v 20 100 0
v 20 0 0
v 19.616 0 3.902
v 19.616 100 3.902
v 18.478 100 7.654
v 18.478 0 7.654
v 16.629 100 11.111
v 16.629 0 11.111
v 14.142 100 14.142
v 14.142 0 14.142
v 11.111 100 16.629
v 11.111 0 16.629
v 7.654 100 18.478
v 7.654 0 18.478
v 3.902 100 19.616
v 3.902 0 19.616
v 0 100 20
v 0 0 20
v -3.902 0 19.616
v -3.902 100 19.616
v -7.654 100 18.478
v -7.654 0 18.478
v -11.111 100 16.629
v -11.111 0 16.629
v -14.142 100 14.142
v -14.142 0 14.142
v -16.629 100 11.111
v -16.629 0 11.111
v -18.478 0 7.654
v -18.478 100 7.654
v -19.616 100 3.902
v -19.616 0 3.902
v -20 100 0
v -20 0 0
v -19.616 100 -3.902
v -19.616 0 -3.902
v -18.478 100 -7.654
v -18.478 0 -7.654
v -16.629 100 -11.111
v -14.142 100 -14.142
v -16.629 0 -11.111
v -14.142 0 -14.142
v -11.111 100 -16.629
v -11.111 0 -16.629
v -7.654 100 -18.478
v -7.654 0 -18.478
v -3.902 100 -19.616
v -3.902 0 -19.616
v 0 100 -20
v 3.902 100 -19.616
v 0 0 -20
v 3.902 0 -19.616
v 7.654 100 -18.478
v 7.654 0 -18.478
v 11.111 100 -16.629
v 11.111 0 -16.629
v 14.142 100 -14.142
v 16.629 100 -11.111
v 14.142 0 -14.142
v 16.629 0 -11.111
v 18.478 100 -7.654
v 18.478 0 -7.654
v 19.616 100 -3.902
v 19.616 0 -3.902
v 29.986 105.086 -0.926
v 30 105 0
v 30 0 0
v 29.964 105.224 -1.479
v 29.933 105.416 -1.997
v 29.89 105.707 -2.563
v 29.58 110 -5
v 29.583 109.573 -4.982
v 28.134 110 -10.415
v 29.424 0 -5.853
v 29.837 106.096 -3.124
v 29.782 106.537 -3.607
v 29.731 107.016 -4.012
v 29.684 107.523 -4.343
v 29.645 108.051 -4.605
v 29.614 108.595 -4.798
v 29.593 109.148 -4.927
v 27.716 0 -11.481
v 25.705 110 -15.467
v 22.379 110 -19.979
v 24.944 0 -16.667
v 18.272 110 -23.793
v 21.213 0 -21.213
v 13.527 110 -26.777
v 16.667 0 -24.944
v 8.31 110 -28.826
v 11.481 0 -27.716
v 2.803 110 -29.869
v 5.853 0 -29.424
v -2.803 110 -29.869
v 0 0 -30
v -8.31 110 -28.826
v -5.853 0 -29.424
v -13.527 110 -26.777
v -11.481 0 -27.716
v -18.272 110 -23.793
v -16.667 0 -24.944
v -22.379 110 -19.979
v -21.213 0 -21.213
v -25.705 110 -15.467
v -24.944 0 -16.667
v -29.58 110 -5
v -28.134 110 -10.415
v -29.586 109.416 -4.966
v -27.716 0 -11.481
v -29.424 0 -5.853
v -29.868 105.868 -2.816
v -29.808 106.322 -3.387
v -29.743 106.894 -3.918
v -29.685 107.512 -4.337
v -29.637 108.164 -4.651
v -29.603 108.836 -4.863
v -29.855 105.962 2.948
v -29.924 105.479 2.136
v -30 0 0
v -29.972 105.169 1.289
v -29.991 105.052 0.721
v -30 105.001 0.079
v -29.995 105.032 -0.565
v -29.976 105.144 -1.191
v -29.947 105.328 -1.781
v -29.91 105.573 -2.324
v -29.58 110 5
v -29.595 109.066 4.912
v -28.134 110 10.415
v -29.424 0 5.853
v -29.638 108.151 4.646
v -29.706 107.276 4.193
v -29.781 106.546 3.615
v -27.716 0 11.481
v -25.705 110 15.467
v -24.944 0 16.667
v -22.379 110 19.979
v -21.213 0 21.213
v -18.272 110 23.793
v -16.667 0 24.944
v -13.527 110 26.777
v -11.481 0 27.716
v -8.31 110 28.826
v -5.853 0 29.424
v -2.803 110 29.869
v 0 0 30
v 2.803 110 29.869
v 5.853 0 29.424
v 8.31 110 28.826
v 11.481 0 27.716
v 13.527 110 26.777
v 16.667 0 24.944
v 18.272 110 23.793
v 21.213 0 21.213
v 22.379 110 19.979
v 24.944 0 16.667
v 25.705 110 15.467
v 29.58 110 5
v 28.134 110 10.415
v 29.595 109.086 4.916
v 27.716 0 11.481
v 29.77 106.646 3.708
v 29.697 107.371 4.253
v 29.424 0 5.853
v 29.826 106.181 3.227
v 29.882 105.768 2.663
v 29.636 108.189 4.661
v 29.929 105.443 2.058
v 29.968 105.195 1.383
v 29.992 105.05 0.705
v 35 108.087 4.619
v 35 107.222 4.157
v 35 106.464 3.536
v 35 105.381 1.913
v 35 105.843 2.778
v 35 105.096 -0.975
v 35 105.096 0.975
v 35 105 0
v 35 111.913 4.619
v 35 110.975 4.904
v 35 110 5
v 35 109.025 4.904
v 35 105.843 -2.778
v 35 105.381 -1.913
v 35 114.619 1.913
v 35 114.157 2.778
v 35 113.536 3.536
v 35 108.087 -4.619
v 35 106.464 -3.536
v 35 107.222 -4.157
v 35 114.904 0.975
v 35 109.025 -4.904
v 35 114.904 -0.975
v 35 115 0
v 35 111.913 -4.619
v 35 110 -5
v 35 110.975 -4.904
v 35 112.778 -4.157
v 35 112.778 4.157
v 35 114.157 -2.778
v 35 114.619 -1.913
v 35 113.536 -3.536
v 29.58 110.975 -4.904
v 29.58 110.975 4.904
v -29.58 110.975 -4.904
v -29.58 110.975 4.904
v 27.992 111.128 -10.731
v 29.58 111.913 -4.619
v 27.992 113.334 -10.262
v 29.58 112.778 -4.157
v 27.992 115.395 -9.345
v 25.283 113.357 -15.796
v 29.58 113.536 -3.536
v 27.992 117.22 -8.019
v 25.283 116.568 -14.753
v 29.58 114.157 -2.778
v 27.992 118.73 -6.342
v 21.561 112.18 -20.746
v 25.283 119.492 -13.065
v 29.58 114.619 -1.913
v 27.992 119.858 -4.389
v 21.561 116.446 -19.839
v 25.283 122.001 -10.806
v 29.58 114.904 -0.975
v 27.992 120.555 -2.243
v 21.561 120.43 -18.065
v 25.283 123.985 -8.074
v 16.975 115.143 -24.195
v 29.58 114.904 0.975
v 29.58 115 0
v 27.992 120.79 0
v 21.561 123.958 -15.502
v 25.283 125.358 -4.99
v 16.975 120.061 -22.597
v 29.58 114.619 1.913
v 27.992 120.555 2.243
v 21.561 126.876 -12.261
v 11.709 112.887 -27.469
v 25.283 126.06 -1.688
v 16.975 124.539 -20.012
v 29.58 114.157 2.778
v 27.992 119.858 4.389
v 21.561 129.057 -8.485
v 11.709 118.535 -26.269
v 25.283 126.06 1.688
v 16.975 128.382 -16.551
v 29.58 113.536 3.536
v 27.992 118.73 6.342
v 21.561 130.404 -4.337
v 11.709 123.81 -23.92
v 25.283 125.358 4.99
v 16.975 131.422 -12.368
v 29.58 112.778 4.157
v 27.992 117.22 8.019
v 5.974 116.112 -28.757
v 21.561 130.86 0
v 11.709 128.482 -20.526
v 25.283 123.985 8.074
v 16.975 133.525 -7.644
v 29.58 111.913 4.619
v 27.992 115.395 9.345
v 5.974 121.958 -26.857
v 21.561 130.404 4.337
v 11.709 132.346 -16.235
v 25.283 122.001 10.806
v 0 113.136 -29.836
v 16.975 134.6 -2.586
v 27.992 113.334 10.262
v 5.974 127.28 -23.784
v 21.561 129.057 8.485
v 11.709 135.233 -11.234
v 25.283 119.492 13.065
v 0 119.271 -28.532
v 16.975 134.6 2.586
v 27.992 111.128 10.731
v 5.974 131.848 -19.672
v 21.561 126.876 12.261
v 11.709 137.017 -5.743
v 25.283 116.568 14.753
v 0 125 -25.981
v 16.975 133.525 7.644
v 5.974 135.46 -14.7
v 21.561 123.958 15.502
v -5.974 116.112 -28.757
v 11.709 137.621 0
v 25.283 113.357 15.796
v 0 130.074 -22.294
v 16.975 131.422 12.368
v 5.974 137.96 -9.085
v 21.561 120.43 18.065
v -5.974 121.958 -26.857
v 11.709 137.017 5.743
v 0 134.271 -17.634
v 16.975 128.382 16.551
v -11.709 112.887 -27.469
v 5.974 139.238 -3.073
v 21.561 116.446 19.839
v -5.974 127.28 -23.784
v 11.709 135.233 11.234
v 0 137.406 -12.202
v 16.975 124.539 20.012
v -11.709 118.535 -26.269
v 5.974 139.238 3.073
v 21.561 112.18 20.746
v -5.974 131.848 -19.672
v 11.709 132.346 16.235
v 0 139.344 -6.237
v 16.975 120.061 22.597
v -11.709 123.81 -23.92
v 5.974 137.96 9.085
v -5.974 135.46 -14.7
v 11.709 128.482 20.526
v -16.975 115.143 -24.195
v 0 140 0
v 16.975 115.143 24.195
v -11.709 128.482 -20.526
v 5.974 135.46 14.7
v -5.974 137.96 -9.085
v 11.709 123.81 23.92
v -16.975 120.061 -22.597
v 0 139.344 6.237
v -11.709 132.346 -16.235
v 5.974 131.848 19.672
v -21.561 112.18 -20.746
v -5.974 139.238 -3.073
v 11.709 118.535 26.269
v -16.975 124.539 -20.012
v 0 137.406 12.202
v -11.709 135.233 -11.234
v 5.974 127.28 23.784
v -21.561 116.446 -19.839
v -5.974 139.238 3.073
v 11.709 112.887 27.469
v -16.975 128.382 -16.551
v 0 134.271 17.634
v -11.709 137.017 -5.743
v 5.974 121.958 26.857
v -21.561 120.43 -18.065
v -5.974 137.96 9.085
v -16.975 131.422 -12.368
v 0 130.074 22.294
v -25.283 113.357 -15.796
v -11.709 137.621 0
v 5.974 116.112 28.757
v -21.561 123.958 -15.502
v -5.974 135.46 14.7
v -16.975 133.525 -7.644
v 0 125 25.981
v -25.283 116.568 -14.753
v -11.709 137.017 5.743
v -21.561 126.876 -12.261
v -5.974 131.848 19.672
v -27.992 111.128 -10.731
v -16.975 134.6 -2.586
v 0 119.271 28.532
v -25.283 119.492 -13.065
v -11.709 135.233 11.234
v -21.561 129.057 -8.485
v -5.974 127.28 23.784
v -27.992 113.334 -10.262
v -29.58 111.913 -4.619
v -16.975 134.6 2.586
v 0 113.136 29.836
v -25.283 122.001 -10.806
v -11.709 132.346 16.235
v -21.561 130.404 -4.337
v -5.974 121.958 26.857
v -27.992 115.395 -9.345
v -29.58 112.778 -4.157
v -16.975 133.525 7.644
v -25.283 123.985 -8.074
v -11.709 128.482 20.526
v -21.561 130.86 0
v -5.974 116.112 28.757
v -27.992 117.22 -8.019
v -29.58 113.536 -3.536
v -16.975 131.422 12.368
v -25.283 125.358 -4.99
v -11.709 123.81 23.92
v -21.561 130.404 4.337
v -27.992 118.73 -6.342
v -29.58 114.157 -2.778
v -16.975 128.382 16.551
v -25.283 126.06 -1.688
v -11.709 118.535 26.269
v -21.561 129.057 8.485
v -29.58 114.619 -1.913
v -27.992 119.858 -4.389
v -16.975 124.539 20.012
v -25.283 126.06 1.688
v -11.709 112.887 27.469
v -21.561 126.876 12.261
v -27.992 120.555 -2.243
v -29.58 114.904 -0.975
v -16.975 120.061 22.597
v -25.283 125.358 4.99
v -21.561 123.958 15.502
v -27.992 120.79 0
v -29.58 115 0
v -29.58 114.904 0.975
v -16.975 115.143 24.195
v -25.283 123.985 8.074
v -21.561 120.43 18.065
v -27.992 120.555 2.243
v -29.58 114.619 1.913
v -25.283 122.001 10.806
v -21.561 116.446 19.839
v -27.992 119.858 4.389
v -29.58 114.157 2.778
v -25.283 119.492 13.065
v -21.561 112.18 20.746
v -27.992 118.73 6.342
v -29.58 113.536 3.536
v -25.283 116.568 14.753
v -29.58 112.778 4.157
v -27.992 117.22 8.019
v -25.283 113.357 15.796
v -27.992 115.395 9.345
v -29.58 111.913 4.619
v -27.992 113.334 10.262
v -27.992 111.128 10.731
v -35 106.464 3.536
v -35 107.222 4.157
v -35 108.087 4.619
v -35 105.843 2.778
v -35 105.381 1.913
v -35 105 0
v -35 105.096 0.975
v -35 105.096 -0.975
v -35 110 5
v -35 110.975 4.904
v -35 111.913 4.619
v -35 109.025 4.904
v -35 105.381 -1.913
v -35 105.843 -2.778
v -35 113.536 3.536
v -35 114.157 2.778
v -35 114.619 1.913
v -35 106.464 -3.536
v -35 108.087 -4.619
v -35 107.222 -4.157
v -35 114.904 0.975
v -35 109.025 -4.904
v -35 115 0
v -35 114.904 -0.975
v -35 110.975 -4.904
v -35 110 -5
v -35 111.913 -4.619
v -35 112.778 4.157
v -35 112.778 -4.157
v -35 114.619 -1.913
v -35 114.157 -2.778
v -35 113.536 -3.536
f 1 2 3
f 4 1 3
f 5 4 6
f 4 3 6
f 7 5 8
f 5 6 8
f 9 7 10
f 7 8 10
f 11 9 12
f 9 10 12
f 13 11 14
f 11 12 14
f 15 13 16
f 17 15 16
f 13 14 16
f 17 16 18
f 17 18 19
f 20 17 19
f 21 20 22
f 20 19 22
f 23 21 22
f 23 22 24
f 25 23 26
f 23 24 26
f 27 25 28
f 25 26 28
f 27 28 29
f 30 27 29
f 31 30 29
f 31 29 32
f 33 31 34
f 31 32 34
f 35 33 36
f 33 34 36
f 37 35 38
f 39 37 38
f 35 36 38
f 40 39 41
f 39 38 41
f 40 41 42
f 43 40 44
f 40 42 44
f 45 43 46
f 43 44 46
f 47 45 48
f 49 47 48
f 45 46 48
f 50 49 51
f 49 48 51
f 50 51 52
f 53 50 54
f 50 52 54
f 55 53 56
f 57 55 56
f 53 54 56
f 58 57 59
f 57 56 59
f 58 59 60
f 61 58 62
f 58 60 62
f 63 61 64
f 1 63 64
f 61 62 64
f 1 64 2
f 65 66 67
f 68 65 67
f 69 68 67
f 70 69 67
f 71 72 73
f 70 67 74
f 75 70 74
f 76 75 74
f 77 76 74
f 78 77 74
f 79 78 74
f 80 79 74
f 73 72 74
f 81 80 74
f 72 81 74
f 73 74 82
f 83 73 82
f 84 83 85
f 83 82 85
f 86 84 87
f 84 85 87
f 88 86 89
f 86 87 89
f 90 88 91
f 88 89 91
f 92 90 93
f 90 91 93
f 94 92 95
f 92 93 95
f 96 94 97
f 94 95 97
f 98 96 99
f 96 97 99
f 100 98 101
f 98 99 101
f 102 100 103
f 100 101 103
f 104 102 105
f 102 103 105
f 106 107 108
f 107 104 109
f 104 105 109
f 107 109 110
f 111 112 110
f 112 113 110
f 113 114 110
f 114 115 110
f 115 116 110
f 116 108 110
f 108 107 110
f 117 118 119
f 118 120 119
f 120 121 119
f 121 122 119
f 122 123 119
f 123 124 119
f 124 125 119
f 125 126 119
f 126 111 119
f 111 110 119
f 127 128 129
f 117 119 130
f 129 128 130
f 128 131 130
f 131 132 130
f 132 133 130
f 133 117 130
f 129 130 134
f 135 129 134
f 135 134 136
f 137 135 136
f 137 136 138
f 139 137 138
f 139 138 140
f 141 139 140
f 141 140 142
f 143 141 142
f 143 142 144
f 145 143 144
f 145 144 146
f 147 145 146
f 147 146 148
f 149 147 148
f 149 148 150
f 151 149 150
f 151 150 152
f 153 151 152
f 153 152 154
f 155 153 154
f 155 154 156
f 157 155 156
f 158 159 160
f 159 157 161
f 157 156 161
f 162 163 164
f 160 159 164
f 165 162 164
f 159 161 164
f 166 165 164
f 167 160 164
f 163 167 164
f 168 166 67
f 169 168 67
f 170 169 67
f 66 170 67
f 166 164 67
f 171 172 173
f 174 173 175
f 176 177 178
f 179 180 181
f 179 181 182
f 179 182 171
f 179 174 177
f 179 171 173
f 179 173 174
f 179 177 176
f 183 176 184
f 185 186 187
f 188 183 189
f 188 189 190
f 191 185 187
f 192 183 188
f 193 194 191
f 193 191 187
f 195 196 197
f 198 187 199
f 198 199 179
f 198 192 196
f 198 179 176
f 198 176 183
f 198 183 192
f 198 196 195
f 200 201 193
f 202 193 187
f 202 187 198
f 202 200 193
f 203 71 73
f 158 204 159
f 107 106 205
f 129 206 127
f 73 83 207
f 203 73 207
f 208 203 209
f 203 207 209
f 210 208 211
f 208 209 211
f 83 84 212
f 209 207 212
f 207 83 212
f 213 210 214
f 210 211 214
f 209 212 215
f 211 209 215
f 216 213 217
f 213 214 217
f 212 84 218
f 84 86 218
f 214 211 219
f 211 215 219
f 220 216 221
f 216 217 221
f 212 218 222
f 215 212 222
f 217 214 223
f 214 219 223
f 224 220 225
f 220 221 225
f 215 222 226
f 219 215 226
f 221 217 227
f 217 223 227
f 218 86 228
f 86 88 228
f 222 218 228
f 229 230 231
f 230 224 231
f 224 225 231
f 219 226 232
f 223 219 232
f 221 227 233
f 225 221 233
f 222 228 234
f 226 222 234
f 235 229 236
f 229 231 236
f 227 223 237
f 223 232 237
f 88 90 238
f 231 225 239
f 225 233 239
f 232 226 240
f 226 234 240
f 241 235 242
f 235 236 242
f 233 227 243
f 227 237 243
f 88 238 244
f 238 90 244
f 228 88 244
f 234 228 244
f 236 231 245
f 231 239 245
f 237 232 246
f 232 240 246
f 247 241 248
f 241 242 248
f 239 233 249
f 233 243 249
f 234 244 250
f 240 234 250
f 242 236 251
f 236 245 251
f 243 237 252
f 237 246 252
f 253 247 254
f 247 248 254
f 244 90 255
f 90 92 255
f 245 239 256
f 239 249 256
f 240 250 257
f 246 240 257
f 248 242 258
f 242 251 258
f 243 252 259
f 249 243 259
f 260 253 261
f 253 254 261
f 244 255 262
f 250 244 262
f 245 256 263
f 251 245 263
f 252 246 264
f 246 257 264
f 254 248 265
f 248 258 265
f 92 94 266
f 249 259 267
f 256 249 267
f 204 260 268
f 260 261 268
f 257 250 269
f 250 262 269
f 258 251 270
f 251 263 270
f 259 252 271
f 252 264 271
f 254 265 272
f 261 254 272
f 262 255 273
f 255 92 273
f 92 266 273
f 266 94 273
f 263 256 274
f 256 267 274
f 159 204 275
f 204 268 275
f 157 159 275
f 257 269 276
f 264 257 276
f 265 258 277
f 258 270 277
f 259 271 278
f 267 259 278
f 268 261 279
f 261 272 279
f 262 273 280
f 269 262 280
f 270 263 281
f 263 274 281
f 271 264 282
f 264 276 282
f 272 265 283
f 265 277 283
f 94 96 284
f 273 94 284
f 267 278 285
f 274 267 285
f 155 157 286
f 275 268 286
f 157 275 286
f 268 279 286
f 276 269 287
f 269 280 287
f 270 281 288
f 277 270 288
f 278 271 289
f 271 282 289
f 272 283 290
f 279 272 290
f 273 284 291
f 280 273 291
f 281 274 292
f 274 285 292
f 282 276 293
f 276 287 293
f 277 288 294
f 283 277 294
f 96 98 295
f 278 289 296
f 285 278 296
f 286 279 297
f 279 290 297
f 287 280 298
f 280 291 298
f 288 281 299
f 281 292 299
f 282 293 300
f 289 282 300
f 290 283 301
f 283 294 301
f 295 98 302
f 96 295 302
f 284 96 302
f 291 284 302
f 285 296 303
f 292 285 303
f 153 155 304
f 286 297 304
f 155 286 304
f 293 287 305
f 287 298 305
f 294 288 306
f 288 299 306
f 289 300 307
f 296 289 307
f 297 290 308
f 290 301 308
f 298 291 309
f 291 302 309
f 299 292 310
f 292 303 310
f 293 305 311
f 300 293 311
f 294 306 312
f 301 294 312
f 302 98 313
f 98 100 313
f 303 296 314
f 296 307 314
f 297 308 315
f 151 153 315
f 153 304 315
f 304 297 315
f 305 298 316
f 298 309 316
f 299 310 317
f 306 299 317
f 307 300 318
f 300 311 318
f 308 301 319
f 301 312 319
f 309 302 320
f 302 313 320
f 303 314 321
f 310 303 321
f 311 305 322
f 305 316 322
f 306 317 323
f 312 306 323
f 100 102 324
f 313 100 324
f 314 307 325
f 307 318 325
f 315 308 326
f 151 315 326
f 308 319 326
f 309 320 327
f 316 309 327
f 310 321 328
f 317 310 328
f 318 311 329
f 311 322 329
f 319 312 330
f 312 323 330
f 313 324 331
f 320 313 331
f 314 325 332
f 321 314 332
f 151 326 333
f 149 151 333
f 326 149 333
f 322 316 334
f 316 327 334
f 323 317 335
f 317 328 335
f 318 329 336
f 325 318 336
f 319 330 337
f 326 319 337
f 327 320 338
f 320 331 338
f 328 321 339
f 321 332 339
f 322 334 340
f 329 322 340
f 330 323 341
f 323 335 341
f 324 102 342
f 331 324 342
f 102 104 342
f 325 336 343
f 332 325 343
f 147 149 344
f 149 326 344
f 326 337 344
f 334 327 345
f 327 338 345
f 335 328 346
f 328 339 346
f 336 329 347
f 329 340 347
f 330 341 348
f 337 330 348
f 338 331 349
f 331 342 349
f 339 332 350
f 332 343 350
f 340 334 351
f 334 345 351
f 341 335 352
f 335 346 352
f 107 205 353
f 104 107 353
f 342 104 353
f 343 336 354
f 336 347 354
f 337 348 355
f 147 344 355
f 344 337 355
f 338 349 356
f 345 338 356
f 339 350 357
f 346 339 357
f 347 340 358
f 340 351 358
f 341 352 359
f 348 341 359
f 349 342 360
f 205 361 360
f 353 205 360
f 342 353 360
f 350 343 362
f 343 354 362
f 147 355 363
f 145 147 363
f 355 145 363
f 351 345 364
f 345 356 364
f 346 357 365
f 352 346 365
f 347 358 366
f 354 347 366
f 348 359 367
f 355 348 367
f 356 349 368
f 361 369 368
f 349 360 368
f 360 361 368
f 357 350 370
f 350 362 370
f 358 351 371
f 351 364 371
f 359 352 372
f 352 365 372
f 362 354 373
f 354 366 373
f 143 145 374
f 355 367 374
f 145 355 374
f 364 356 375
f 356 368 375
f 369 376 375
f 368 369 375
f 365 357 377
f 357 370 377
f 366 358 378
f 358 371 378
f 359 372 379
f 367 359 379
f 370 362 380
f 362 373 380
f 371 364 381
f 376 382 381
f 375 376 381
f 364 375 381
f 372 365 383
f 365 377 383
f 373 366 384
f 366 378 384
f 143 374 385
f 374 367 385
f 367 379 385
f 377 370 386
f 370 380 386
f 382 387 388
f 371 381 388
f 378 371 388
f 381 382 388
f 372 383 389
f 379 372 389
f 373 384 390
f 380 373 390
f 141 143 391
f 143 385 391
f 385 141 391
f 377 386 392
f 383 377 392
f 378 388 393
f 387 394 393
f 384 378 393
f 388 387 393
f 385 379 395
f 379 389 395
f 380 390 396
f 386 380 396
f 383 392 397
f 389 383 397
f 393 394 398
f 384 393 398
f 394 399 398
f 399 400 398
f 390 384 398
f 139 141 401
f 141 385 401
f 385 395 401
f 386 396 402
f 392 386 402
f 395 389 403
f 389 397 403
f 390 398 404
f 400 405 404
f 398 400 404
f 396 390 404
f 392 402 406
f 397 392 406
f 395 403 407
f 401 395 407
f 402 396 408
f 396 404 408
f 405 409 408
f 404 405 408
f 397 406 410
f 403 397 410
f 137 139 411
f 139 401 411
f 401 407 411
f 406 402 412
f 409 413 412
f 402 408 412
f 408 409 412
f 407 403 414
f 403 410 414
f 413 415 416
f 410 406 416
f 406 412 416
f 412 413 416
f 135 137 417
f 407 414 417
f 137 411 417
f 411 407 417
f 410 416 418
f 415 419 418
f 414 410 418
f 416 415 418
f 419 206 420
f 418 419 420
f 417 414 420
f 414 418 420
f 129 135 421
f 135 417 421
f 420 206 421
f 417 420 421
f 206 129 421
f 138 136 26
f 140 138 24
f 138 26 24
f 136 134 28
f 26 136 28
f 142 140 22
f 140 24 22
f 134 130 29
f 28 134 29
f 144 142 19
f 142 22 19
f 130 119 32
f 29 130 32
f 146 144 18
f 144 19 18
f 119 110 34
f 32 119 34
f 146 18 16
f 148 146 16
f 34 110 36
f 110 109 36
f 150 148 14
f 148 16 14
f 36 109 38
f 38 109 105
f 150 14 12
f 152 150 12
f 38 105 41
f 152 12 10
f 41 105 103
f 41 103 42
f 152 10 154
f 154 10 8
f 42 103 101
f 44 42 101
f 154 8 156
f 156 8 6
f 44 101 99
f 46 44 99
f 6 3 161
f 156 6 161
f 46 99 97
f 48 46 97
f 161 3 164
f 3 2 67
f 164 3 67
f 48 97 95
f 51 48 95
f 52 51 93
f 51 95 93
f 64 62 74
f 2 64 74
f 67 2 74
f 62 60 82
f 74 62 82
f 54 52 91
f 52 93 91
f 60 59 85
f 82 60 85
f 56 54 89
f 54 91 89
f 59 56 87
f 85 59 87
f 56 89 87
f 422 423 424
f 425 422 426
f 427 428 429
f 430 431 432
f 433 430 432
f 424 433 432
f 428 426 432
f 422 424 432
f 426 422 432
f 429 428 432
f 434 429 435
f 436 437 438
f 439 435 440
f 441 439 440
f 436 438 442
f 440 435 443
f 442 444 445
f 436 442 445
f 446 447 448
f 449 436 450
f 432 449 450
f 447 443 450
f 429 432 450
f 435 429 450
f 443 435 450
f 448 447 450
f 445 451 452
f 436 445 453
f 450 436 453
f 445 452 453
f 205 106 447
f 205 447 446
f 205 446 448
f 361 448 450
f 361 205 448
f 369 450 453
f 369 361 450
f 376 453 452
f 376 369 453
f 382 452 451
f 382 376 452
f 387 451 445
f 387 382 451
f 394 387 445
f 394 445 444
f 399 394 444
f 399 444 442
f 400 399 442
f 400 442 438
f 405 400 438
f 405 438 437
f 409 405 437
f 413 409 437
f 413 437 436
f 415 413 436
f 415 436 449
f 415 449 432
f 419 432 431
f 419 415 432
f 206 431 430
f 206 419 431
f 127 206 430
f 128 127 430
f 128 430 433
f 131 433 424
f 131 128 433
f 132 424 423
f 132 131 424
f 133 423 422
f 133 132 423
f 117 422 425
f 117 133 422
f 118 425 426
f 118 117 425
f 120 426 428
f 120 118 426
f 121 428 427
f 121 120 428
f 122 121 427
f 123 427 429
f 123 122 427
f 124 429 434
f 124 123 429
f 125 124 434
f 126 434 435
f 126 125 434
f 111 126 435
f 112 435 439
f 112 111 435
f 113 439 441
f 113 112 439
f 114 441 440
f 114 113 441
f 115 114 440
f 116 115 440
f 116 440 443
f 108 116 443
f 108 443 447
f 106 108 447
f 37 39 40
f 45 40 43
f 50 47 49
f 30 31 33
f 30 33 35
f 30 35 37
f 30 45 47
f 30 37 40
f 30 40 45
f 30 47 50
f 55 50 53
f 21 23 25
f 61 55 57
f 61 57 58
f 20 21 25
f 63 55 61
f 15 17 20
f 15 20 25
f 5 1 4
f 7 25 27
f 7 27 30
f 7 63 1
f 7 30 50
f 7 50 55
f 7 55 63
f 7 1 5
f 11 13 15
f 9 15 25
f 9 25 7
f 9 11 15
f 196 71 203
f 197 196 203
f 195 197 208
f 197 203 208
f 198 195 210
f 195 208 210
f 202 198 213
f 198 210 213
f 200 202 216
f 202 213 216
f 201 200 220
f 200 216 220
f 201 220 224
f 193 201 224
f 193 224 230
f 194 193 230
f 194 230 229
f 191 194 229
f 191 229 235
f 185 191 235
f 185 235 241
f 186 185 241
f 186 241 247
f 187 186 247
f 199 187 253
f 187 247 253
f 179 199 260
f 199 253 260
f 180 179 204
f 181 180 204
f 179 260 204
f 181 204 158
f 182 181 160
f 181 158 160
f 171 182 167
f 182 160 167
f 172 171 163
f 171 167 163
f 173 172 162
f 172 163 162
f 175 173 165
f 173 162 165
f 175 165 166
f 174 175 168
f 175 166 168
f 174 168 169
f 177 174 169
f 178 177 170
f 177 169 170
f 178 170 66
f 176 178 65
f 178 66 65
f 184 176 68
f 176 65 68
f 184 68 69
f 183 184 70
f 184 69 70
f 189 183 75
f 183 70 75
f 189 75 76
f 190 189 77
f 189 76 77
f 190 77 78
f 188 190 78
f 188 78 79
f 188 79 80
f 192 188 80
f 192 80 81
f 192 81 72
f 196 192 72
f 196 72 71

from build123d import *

# Parameters (mm, degrees)
SKETCH1_R           = 30
BOSS_EXTRUDE1_DEPTH = 110
SKETCH6_R           = 20
CUT_EXTRUDE2_DEPTH  = 100
SKETCH7_R           = 5
BOSS_EXTRUDE2_DEPTH = 35


with BuildPart() as part:
    # Sketch1 → Boss-Extrude1 (new body)
    with BuildSketch(Plane(origin=(0, 0, 0), x_dir=(1, 0, 0), z_dir=(0, 1, 0))):
        Circle(SKETCH1_R)
    extrude(amount=BOSS_EXTRUDE1_DEPTH)

    # Sketch5 → Revolve1 (revolve)
    with BuildSketch(Plane.XY):
        with BuildLine():
            Line((-30, 110), (0, 110))
            Line((0, 110), (30, 110))
            ThreePointArc((30, 110), (0, 140), (-30, 110))
        make_face()
    revolve(axis=Axis((-30, 110, 0), (1, 0, 0)))

    # Sketch6 → Cut-Extrude2 (cut)
    with BuildSketch(Plane.XZ):
        Circle(SKETCH6_R)
    extrude(amount=-CUT_EXTRUDE2_DEPTH, mode=Mode.SUBTRACT)

    # Sketch7 → Boss-Extrude2 (add)
    with BuildSketch(Plane(origin=(0, 0, 0), x_dir=(0, 0, -1), z_dir=(1, 0, 0))):
        with Locations((0, 110)):
            Circle(SKETCH7_R)
    boss_extrude2 = extrude(amount=BOSS_EXTRUDE2_DEPTH)

    # Mirror1: Boss-Extrude2 across plane
    add(boss_extrude2.mirror(Plane(origin=(0, 0, 0), x_dir=(0, 0, 1), z_dir=(1, 0, 0))))


solid = part.part
